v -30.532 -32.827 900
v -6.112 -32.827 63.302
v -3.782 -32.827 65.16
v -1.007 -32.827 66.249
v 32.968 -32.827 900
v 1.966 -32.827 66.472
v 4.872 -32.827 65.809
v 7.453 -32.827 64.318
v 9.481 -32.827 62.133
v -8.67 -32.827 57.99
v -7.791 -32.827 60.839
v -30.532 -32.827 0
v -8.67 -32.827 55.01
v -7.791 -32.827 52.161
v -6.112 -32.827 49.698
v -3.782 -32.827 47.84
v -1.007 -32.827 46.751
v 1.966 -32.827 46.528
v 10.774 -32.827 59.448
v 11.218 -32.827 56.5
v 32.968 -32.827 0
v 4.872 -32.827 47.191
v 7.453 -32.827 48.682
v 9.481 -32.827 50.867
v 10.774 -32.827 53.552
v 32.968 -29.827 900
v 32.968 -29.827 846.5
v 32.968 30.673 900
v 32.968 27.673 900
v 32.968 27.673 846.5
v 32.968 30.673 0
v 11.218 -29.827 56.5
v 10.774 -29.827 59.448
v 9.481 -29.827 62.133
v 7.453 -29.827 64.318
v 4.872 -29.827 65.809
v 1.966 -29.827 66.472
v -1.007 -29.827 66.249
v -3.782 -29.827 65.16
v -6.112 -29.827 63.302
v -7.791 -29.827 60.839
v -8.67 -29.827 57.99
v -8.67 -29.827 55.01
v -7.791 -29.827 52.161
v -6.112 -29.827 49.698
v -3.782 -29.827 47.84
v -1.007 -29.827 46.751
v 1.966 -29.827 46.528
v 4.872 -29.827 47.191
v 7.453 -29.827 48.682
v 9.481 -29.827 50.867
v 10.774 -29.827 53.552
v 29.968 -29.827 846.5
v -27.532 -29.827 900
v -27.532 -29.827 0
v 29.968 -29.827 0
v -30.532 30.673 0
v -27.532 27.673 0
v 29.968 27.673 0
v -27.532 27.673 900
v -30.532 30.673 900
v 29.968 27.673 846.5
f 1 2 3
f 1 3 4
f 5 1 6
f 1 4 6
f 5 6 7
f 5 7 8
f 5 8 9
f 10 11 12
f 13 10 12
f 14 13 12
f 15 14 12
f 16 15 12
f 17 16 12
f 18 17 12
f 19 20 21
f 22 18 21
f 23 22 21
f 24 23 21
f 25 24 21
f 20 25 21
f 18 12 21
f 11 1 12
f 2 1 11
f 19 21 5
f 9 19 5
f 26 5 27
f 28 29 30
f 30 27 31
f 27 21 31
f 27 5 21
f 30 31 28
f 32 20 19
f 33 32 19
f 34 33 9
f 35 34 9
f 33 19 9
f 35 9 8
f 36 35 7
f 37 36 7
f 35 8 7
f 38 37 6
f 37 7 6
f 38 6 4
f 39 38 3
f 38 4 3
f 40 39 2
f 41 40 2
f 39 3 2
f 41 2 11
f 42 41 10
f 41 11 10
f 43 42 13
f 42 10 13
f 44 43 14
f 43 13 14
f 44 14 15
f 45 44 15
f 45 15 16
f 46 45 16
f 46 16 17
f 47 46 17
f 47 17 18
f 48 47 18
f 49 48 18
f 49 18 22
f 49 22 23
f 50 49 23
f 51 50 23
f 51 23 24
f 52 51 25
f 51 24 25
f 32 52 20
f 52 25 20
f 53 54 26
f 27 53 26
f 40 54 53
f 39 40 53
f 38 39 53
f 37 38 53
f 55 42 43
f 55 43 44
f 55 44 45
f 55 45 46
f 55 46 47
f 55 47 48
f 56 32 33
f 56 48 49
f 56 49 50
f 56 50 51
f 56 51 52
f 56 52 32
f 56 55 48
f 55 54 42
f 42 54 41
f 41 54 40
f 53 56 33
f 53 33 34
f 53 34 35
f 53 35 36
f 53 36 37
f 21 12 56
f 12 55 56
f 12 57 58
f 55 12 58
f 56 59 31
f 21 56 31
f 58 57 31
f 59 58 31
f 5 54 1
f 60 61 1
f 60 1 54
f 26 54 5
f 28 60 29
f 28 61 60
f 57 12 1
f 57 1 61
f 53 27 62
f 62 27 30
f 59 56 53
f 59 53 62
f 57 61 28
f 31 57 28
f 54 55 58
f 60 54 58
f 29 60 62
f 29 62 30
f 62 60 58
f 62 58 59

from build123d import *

# Parameters (mm, degrees)
F0_W     = 63.5
F0_H     = 63.5
F0_W_2   = 57.5
F0_H_2   = 57.5
F1_DEPTH = 900
F2_W     = 57.5
F2_H     = 53.5
F3_DEPTH = 3
F4_R     = 10
F5_DEPTH = 3


with BuildPart() as f1:
    # F0 (on Top) → F1 (new body)
    with BuildSketch(Plane.XY):
        with Locations((1.218427, -1.076905)):
            Rectangle(F0_W, F0_H)
        with Locations((1.218427, -1.076905)):
            Rectangle(F0_W_2, F0_H_2, mode=Mode.SUBTRACT)
    extrude(amount=F1_DEPTH)

    # F2 (on face) → F3 (cut)
    with BuildSketch(Plane.YZ.offset(32.968427)):
        with Locations((-1.076905, 873.25)):
            Rectangle(F2_W, F2_H)
    extrude(amount=-F3_DEPTH, mode=Mode.SUBTRACT)

    # F4 (on face) → F5 (cut)
    with BuildSketch(Plane.XZ.offset(32.826905)):
        with Locations((1.218427, 56.5)):
            Circle(F4_R)
    extrude(amount=-F5_DEPTH, mode=Mode.SUBTRACT)


solid = f1.part
